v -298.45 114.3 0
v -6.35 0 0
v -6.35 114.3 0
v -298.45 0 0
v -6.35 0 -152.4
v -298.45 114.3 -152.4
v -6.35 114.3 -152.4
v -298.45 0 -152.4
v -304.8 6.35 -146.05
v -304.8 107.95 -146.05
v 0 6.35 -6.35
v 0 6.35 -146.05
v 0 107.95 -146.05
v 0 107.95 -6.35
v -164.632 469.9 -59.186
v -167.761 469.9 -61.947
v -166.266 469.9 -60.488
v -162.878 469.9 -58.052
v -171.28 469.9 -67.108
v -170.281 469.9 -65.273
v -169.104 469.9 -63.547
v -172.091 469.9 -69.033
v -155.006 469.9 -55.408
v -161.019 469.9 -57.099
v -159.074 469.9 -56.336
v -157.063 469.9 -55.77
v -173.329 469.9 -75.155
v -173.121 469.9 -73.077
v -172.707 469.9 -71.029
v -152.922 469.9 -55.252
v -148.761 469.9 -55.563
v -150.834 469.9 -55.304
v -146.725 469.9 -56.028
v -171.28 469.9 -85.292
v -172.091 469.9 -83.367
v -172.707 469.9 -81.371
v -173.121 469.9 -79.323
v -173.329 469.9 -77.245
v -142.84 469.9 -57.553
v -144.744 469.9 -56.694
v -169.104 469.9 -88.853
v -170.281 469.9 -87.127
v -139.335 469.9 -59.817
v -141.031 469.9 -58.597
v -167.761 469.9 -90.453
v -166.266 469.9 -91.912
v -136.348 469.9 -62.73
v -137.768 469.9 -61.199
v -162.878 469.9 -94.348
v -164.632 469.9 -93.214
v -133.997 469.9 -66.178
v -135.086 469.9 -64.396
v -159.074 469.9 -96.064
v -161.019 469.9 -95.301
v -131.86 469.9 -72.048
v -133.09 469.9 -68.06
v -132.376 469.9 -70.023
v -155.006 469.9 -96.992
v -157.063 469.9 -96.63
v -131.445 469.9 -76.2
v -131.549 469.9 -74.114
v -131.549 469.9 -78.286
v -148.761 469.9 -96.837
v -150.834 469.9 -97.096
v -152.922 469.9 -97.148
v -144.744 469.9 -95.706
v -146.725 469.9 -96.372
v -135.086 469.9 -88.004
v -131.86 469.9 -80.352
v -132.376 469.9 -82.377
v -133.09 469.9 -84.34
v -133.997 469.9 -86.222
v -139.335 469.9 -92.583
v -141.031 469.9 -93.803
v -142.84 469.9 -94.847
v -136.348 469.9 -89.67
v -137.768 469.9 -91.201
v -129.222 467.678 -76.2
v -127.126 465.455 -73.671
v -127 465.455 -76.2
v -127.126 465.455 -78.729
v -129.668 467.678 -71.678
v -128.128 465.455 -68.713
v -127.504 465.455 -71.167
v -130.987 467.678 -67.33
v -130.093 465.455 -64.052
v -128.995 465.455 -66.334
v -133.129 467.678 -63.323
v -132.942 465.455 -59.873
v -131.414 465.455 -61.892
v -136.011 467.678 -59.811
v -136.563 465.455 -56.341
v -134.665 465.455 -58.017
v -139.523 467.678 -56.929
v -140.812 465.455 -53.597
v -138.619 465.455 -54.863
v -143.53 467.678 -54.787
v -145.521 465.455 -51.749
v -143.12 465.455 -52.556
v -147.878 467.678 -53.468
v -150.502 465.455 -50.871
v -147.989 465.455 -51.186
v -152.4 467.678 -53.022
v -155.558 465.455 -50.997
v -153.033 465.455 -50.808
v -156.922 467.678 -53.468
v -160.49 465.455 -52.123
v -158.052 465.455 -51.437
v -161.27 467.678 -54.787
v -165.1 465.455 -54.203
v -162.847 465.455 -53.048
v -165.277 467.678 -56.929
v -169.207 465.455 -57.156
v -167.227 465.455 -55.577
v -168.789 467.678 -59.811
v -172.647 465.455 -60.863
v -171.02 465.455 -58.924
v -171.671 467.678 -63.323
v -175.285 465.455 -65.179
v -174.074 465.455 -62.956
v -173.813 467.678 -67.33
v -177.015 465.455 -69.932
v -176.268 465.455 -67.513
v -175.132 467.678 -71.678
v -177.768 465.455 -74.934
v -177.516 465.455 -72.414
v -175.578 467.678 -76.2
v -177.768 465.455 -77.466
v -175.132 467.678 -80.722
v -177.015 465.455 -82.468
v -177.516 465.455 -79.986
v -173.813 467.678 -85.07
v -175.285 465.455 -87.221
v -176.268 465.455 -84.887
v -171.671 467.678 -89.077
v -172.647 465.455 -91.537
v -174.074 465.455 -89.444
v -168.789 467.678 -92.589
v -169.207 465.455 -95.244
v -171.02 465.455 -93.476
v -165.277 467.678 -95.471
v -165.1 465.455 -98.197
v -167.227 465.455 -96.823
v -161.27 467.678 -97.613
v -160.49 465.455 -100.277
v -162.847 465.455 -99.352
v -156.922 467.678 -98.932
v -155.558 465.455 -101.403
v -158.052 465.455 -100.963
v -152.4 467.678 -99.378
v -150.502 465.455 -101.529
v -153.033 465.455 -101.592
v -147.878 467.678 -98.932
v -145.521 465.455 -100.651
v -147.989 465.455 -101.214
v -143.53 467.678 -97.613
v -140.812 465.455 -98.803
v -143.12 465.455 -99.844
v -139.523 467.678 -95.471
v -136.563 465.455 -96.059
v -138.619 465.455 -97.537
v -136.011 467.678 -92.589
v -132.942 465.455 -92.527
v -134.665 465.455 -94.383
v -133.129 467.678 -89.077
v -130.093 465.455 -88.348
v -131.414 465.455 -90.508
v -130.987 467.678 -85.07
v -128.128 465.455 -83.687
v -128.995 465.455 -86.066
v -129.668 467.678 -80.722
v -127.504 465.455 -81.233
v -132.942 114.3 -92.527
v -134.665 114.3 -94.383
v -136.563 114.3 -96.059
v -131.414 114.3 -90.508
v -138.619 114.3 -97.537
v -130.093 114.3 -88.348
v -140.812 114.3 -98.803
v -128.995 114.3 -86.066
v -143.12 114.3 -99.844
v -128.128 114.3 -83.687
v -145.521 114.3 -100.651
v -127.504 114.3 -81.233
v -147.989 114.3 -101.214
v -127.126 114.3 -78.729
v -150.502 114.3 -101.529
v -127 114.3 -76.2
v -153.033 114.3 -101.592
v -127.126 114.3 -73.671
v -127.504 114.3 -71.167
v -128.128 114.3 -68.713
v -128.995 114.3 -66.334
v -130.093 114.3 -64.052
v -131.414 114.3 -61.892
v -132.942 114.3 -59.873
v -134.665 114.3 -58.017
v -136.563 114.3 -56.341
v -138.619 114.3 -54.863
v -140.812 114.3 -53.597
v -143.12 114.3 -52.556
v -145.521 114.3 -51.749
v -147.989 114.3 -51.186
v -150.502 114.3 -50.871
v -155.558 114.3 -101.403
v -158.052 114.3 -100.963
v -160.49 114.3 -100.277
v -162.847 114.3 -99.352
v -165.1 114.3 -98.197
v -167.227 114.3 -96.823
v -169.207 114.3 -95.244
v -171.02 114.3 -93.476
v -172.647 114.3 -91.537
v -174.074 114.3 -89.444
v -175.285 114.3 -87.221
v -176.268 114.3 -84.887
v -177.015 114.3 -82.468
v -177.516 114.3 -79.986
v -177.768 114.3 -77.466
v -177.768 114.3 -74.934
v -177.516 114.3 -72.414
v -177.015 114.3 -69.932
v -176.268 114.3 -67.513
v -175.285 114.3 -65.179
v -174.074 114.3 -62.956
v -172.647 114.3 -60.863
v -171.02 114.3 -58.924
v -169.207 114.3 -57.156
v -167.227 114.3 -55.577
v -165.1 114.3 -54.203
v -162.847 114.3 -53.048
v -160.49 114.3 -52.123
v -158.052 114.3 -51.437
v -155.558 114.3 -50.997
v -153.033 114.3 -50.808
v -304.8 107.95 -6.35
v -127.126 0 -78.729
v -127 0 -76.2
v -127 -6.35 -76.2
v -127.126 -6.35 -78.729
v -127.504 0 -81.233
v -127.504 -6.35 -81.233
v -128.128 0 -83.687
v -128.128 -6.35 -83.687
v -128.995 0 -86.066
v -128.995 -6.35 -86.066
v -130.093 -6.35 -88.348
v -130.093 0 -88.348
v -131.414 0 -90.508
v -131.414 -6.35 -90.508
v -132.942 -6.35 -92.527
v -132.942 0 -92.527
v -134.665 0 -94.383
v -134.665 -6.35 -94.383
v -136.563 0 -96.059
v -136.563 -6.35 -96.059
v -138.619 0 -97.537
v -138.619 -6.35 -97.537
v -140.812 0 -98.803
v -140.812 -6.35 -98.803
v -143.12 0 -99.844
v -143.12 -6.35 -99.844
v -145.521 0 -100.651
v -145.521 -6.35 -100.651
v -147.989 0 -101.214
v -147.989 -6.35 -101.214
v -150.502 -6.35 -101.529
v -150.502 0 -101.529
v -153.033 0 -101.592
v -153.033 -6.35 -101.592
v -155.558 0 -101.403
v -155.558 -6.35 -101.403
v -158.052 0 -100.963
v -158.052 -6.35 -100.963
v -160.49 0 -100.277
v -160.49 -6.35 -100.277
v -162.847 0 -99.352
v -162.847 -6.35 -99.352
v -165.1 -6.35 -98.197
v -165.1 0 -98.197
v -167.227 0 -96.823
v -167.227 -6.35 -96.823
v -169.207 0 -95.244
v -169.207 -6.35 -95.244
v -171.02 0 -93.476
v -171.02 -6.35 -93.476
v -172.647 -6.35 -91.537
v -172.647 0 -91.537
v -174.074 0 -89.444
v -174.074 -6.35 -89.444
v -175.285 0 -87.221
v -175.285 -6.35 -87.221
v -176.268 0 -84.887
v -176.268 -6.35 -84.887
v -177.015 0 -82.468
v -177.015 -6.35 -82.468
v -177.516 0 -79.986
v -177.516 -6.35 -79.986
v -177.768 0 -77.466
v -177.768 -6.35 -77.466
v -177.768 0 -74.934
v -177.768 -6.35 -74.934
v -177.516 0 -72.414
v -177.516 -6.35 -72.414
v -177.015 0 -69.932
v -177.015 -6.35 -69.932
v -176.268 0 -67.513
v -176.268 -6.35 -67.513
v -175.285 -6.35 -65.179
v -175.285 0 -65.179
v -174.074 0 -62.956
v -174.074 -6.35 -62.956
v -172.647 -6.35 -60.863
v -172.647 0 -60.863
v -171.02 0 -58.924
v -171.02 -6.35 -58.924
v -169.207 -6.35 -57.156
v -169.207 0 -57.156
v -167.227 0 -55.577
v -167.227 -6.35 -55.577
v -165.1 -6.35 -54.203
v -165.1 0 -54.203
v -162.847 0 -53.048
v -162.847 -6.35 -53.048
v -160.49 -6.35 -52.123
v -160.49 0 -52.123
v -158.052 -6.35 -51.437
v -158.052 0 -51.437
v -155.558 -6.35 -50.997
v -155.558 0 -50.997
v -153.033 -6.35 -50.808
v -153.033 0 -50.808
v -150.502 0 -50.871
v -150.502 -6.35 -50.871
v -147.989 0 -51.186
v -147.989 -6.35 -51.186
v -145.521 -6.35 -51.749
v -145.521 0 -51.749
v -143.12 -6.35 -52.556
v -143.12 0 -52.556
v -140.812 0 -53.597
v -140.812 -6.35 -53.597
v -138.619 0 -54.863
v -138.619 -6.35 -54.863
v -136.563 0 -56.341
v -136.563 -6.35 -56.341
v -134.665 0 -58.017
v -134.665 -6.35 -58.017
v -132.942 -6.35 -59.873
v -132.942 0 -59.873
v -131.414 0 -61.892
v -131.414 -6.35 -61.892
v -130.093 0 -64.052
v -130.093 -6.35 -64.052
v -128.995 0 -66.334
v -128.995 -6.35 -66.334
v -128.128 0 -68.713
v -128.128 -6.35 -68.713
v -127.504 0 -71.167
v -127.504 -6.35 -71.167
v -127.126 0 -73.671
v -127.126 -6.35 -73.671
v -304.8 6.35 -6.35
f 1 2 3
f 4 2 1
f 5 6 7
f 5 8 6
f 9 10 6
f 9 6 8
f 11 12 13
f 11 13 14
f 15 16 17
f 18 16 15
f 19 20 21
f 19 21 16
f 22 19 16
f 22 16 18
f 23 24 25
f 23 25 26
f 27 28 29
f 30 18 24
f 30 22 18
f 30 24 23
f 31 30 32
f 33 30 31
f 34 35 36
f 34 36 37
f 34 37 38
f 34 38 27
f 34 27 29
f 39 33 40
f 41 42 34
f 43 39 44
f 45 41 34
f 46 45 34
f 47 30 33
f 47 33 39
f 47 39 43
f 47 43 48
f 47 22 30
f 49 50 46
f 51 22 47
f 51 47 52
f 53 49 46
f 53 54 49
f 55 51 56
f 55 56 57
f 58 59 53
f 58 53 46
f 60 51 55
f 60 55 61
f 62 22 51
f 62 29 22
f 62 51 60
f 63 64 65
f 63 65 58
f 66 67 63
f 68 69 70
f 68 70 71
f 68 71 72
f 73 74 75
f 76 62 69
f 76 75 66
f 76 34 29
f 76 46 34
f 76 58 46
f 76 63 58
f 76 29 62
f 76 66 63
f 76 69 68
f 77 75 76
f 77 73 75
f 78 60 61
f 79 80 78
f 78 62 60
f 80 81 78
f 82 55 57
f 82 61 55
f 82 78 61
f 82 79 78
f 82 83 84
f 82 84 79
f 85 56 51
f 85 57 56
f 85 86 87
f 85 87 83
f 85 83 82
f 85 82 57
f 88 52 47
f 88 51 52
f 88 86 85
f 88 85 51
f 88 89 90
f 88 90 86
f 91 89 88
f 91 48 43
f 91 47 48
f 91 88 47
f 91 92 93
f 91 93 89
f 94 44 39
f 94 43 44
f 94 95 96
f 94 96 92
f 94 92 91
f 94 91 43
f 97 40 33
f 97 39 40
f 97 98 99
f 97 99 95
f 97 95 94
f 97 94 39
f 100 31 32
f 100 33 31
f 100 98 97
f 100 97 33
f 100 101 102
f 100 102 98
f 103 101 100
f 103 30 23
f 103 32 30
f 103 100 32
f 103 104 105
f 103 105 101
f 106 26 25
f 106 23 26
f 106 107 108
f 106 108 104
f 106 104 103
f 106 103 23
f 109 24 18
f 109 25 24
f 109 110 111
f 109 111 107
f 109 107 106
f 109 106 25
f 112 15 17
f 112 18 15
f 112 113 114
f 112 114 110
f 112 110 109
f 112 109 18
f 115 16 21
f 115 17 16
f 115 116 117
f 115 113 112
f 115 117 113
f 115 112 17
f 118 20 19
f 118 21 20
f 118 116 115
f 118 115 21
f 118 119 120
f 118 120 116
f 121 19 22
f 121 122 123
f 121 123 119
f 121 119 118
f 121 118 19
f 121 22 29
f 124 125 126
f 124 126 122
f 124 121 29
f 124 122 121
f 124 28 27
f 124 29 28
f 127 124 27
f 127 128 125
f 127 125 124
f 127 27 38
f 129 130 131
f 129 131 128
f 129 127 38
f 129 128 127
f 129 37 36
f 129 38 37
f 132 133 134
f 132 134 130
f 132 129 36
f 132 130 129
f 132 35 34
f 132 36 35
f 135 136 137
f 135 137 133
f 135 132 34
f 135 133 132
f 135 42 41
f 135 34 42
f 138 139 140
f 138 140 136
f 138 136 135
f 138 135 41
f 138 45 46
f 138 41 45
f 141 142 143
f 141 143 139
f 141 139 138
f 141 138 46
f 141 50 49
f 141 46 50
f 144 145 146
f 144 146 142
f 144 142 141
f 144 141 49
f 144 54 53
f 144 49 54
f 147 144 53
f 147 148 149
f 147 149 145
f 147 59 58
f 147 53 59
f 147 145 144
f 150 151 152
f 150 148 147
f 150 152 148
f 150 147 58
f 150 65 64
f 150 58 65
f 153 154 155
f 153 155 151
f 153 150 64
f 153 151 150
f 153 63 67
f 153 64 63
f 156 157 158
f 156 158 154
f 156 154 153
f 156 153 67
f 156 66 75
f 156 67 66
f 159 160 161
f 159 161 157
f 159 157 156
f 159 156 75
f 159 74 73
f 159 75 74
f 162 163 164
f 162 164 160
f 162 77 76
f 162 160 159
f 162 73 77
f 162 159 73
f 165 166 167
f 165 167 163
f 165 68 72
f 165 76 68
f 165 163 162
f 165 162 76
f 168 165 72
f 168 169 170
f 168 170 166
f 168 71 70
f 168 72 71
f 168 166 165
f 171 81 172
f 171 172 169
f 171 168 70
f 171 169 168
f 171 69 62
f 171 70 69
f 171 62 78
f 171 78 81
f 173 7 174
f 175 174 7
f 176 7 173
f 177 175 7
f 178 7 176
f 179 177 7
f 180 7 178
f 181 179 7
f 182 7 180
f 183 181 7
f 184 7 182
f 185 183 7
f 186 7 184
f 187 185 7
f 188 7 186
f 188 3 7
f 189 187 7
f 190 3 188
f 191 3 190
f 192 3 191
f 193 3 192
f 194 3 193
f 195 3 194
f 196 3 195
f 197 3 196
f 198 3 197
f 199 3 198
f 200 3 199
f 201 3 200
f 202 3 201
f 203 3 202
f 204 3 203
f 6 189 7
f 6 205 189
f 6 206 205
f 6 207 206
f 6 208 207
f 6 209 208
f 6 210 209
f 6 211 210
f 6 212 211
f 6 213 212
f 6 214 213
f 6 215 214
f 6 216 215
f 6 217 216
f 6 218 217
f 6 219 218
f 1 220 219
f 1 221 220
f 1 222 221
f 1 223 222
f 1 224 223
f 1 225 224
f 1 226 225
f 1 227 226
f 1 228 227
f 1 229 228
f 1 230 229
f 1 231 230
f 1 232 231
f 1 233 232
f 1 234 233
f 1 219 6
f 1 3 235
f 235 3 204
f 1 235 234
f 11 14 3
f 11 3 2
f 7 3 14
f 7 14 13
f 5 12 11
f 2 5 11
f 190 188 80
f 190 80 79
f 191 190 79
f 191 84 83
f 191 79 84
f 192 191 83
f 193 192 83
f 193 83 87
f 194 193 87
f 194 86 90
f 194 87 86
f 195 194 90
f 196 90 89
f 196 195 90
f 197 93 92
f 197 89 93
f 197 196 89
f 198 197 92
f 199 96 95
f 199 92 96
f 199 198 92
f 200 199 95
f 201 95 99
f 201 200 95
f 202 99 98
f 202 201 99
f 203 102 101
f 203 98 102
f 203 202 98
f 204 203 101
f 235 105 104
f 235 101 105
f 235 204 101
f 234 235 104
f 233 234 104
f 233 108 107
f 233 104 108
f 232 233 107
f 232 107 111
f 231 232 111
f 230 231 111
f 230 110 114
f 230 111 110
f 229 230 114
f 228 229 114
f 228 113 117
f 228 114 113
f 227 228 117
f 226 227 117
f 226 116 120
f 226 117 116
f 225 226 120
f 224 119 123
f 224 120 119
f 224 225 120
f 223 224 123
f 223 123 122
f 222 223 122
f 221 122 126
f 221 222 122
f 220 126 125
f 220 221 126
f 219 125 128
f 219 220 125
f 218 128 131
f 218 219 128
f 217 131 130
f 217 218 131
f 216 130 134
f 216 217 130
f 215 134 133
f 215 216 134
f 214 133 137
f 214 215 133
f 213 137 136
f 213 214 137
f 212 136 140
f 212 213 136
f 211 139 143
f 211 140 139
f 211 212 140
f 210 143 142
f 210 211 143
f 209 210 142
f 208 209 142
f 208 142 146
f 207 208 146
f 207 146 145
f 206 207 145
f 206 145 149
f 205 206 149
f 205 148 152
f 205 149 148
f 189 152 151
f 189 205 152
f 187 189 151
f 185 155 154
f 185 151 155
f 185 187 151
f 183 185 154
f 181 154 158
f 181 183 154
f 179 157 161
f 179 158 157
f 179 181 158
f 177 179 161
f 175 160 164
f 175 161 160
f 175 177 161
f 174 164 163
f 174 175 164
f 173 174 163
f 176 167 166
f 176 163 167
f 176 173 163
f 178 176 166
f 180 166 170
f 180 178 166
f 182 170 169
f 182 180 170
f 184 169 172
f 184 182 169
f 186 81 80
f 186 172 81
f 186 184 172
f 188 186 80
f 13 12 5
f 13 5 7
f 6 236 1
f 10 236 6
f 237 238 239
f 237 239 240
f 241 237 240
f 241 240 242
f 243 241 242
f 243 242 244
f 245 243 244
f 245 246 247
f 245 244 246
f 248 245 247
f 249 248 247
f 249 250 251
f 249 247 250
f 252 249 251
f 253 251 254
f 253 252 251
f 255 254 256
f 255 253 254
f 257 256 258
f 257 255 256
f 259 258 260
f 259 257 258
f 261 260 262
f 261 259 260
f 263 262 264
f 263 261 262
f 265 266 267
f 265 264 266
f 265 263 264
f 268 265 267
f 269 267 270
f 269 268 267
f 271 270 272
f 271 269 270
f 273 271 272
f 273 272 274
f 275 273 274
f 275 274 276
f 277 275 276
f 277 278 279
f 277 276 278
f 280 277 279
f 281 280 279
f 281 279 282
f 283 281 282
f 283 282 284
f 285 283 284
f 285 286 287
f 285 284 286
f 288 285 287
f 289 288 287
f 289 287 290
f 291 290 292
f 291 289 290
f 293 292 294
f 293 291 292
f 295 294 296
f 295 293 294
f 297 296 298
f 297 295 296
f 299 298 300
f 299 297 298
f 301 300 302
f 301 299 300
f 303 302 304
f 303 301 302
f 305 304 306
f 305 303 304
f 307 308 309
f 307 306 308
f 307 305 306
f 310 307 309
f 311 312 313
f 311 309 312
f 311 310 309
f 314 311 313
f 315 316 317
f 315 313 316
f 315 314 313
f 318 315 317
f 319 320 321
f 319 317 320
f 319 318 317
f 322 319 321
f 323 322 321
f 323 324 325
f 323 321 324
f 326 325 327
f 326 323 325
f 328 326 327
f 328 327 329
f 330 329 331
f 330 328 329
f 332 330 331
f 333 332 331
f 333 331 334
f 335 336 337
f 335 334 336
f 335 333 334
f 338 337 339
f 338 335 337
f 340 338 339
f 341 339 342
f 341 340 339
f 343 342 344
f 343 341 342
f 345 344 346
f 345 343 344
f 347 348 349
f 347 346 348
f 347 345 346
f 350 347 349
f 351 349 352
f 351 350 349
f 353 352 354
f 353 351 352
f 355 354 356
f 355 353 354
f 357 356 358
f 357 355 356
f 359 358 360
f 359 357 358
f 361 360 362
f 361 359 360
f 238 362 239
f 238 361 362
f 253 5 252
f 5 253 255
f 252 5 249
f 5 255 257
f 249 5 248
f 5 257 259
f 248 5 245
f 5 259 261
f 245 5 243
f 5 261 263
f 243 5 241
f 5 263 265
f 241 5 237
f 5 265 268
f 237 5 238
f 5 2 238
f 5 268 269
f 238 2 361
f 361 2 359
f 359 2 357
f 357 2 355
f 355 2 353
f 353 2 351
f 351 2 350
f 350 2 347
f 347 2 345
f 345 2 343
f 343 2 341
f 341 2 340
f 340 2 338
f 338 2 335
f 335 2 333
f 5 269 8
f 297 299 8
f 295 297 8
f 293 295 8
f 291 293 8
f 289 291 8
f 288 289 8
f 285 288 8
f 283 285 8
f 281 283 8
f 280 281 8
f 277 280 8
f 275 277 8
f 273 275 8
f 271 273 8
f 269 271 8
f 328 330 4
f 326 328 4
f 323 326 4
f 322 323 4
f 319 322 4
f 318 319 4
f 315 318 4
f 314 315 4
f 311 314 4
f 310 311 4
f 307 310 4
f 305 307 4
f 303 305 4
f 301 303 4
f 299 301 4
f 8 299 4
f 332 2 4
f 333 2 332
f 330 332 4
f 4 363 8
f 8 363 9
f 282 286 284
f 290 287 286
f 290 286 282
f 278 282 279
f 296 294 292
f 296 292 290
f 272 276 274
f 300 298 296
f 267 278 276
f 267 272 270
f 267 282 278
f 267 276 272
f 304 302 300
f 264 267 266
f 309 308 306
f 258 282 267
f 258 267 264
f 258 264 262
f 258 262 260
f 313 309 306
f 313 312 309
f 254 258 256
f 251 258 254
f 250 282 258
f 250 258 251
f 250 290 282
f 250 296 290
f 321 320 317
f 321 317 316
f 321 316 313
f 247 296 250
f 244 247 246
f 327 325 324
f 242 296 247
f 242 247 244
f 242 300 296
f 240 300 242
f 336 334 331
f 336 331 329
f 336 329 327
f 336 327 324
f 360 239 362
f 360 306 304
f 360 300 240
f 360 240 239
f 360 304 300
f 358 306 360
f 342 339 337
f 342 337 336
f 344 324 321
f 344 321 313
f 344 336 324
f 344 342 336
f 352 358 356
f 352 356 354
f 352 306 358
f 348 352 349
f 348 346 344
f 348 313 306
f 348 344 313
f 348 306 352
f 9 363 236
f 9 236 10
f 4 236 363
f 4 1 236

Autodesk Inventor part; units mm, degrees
ref_plane "YZ Plane" through (0, 0, 0) normal (1, 0, 0) x (0, 1, 0)
ref_plane "XZ Plane" through (0, 0, 0) normal (0, 1, 0) x (-1, 0, 0)
ref_plane "XY Plane" through (0, 0, 0) normal (0, 0, 1) x (1, 0, 0)
sketch "Sketch1" plane through (0, 0, 0) normal (0, 1, 0) x (-1, 0, 0)
  line L0 (0, 0) -> (304.8, 0)
  line L1 (304.8, 0) -> (304.8, -152.4)
  line L2 (304.8, -152.4) -> (0, -152.4)
  line L3 (0, -152.4) -> (0, 0)
  dimension "d0" = 304.8
  dimension "d1" = 152.4
extrude "Extrusion1" add sketch "Sketch1" along normal blind 114.3
sketch "Sketch2" plane through (0, 114.3, 0) normal (0, 1, 0) x (1, 0, 0)
  circle A0 centre (-152.4, 76.2) radius 25.4
  line L0 (0, 0) -> (0, 152.4) projected
  line L1 (0, 152.4) -> (-304.8, 152.4) projected
  dimension "d4" = 152.4
  dimension "d5" = 76.2
  dimension "d6" = 50.8
extrude "Extrusion2" add sketch "Sketch2" along normal blind 355.6
sketch "Sketch3" plane through (0, 0, 0) normal (1, 0, 0) x (0, 0, -1)
  line L0 (152.4, 0) -> (152.4, 114.3) projected
  line L1 (0, 0) -> (152.4, 0)
  line L2 (152.4, 0) -> (152.4, 114.3)
  line L3 (152.4, 114.3) -> (0, 114.3)
  line L4 (0, 114.3) -> (0, 0)
chamfer "Chamfer1" distance 6.35 angle 45 1 edges at (0, 114.3, -76.2)
chamfer "Chamfer2" distance 6.35 angle 45 1 edges at (0, 53.975, 0)
chamfer "Chamfer3" distance 6.35 angle 45 1 edges at (0, 0, -79.375)
chamfer "Chamfer4" distance 6.35 angle 45 1 edges at (0, 57.15, -152.4)
chamfer "Chamfer5" distance 6.35 angle 45 4 edges at (-304.8, 114.3, -76.2) (-304.8, 57.15, -152.4) (-304.8, 57.15, 0) (-304.8, 0, -76.2)
chamfer "Chamfer6" distance 4.445 angle 45 1 edges at (-177.8, 469.9, -76.2)
sketch "Sketch4" plane through (0, 0, 0) normal (0, -1, 0) x (1, 0, 0)
  circle A0 centre (-152.4, -76.2) radius 25.4 projected
  circle A1 centre (-152.4, -76.2) radius 25.4
  point P0 (0, 0)
extrude "Extrusion3" add sketch "Sketch4" along normal blind 6.35
properties part number "Mjolnir"
